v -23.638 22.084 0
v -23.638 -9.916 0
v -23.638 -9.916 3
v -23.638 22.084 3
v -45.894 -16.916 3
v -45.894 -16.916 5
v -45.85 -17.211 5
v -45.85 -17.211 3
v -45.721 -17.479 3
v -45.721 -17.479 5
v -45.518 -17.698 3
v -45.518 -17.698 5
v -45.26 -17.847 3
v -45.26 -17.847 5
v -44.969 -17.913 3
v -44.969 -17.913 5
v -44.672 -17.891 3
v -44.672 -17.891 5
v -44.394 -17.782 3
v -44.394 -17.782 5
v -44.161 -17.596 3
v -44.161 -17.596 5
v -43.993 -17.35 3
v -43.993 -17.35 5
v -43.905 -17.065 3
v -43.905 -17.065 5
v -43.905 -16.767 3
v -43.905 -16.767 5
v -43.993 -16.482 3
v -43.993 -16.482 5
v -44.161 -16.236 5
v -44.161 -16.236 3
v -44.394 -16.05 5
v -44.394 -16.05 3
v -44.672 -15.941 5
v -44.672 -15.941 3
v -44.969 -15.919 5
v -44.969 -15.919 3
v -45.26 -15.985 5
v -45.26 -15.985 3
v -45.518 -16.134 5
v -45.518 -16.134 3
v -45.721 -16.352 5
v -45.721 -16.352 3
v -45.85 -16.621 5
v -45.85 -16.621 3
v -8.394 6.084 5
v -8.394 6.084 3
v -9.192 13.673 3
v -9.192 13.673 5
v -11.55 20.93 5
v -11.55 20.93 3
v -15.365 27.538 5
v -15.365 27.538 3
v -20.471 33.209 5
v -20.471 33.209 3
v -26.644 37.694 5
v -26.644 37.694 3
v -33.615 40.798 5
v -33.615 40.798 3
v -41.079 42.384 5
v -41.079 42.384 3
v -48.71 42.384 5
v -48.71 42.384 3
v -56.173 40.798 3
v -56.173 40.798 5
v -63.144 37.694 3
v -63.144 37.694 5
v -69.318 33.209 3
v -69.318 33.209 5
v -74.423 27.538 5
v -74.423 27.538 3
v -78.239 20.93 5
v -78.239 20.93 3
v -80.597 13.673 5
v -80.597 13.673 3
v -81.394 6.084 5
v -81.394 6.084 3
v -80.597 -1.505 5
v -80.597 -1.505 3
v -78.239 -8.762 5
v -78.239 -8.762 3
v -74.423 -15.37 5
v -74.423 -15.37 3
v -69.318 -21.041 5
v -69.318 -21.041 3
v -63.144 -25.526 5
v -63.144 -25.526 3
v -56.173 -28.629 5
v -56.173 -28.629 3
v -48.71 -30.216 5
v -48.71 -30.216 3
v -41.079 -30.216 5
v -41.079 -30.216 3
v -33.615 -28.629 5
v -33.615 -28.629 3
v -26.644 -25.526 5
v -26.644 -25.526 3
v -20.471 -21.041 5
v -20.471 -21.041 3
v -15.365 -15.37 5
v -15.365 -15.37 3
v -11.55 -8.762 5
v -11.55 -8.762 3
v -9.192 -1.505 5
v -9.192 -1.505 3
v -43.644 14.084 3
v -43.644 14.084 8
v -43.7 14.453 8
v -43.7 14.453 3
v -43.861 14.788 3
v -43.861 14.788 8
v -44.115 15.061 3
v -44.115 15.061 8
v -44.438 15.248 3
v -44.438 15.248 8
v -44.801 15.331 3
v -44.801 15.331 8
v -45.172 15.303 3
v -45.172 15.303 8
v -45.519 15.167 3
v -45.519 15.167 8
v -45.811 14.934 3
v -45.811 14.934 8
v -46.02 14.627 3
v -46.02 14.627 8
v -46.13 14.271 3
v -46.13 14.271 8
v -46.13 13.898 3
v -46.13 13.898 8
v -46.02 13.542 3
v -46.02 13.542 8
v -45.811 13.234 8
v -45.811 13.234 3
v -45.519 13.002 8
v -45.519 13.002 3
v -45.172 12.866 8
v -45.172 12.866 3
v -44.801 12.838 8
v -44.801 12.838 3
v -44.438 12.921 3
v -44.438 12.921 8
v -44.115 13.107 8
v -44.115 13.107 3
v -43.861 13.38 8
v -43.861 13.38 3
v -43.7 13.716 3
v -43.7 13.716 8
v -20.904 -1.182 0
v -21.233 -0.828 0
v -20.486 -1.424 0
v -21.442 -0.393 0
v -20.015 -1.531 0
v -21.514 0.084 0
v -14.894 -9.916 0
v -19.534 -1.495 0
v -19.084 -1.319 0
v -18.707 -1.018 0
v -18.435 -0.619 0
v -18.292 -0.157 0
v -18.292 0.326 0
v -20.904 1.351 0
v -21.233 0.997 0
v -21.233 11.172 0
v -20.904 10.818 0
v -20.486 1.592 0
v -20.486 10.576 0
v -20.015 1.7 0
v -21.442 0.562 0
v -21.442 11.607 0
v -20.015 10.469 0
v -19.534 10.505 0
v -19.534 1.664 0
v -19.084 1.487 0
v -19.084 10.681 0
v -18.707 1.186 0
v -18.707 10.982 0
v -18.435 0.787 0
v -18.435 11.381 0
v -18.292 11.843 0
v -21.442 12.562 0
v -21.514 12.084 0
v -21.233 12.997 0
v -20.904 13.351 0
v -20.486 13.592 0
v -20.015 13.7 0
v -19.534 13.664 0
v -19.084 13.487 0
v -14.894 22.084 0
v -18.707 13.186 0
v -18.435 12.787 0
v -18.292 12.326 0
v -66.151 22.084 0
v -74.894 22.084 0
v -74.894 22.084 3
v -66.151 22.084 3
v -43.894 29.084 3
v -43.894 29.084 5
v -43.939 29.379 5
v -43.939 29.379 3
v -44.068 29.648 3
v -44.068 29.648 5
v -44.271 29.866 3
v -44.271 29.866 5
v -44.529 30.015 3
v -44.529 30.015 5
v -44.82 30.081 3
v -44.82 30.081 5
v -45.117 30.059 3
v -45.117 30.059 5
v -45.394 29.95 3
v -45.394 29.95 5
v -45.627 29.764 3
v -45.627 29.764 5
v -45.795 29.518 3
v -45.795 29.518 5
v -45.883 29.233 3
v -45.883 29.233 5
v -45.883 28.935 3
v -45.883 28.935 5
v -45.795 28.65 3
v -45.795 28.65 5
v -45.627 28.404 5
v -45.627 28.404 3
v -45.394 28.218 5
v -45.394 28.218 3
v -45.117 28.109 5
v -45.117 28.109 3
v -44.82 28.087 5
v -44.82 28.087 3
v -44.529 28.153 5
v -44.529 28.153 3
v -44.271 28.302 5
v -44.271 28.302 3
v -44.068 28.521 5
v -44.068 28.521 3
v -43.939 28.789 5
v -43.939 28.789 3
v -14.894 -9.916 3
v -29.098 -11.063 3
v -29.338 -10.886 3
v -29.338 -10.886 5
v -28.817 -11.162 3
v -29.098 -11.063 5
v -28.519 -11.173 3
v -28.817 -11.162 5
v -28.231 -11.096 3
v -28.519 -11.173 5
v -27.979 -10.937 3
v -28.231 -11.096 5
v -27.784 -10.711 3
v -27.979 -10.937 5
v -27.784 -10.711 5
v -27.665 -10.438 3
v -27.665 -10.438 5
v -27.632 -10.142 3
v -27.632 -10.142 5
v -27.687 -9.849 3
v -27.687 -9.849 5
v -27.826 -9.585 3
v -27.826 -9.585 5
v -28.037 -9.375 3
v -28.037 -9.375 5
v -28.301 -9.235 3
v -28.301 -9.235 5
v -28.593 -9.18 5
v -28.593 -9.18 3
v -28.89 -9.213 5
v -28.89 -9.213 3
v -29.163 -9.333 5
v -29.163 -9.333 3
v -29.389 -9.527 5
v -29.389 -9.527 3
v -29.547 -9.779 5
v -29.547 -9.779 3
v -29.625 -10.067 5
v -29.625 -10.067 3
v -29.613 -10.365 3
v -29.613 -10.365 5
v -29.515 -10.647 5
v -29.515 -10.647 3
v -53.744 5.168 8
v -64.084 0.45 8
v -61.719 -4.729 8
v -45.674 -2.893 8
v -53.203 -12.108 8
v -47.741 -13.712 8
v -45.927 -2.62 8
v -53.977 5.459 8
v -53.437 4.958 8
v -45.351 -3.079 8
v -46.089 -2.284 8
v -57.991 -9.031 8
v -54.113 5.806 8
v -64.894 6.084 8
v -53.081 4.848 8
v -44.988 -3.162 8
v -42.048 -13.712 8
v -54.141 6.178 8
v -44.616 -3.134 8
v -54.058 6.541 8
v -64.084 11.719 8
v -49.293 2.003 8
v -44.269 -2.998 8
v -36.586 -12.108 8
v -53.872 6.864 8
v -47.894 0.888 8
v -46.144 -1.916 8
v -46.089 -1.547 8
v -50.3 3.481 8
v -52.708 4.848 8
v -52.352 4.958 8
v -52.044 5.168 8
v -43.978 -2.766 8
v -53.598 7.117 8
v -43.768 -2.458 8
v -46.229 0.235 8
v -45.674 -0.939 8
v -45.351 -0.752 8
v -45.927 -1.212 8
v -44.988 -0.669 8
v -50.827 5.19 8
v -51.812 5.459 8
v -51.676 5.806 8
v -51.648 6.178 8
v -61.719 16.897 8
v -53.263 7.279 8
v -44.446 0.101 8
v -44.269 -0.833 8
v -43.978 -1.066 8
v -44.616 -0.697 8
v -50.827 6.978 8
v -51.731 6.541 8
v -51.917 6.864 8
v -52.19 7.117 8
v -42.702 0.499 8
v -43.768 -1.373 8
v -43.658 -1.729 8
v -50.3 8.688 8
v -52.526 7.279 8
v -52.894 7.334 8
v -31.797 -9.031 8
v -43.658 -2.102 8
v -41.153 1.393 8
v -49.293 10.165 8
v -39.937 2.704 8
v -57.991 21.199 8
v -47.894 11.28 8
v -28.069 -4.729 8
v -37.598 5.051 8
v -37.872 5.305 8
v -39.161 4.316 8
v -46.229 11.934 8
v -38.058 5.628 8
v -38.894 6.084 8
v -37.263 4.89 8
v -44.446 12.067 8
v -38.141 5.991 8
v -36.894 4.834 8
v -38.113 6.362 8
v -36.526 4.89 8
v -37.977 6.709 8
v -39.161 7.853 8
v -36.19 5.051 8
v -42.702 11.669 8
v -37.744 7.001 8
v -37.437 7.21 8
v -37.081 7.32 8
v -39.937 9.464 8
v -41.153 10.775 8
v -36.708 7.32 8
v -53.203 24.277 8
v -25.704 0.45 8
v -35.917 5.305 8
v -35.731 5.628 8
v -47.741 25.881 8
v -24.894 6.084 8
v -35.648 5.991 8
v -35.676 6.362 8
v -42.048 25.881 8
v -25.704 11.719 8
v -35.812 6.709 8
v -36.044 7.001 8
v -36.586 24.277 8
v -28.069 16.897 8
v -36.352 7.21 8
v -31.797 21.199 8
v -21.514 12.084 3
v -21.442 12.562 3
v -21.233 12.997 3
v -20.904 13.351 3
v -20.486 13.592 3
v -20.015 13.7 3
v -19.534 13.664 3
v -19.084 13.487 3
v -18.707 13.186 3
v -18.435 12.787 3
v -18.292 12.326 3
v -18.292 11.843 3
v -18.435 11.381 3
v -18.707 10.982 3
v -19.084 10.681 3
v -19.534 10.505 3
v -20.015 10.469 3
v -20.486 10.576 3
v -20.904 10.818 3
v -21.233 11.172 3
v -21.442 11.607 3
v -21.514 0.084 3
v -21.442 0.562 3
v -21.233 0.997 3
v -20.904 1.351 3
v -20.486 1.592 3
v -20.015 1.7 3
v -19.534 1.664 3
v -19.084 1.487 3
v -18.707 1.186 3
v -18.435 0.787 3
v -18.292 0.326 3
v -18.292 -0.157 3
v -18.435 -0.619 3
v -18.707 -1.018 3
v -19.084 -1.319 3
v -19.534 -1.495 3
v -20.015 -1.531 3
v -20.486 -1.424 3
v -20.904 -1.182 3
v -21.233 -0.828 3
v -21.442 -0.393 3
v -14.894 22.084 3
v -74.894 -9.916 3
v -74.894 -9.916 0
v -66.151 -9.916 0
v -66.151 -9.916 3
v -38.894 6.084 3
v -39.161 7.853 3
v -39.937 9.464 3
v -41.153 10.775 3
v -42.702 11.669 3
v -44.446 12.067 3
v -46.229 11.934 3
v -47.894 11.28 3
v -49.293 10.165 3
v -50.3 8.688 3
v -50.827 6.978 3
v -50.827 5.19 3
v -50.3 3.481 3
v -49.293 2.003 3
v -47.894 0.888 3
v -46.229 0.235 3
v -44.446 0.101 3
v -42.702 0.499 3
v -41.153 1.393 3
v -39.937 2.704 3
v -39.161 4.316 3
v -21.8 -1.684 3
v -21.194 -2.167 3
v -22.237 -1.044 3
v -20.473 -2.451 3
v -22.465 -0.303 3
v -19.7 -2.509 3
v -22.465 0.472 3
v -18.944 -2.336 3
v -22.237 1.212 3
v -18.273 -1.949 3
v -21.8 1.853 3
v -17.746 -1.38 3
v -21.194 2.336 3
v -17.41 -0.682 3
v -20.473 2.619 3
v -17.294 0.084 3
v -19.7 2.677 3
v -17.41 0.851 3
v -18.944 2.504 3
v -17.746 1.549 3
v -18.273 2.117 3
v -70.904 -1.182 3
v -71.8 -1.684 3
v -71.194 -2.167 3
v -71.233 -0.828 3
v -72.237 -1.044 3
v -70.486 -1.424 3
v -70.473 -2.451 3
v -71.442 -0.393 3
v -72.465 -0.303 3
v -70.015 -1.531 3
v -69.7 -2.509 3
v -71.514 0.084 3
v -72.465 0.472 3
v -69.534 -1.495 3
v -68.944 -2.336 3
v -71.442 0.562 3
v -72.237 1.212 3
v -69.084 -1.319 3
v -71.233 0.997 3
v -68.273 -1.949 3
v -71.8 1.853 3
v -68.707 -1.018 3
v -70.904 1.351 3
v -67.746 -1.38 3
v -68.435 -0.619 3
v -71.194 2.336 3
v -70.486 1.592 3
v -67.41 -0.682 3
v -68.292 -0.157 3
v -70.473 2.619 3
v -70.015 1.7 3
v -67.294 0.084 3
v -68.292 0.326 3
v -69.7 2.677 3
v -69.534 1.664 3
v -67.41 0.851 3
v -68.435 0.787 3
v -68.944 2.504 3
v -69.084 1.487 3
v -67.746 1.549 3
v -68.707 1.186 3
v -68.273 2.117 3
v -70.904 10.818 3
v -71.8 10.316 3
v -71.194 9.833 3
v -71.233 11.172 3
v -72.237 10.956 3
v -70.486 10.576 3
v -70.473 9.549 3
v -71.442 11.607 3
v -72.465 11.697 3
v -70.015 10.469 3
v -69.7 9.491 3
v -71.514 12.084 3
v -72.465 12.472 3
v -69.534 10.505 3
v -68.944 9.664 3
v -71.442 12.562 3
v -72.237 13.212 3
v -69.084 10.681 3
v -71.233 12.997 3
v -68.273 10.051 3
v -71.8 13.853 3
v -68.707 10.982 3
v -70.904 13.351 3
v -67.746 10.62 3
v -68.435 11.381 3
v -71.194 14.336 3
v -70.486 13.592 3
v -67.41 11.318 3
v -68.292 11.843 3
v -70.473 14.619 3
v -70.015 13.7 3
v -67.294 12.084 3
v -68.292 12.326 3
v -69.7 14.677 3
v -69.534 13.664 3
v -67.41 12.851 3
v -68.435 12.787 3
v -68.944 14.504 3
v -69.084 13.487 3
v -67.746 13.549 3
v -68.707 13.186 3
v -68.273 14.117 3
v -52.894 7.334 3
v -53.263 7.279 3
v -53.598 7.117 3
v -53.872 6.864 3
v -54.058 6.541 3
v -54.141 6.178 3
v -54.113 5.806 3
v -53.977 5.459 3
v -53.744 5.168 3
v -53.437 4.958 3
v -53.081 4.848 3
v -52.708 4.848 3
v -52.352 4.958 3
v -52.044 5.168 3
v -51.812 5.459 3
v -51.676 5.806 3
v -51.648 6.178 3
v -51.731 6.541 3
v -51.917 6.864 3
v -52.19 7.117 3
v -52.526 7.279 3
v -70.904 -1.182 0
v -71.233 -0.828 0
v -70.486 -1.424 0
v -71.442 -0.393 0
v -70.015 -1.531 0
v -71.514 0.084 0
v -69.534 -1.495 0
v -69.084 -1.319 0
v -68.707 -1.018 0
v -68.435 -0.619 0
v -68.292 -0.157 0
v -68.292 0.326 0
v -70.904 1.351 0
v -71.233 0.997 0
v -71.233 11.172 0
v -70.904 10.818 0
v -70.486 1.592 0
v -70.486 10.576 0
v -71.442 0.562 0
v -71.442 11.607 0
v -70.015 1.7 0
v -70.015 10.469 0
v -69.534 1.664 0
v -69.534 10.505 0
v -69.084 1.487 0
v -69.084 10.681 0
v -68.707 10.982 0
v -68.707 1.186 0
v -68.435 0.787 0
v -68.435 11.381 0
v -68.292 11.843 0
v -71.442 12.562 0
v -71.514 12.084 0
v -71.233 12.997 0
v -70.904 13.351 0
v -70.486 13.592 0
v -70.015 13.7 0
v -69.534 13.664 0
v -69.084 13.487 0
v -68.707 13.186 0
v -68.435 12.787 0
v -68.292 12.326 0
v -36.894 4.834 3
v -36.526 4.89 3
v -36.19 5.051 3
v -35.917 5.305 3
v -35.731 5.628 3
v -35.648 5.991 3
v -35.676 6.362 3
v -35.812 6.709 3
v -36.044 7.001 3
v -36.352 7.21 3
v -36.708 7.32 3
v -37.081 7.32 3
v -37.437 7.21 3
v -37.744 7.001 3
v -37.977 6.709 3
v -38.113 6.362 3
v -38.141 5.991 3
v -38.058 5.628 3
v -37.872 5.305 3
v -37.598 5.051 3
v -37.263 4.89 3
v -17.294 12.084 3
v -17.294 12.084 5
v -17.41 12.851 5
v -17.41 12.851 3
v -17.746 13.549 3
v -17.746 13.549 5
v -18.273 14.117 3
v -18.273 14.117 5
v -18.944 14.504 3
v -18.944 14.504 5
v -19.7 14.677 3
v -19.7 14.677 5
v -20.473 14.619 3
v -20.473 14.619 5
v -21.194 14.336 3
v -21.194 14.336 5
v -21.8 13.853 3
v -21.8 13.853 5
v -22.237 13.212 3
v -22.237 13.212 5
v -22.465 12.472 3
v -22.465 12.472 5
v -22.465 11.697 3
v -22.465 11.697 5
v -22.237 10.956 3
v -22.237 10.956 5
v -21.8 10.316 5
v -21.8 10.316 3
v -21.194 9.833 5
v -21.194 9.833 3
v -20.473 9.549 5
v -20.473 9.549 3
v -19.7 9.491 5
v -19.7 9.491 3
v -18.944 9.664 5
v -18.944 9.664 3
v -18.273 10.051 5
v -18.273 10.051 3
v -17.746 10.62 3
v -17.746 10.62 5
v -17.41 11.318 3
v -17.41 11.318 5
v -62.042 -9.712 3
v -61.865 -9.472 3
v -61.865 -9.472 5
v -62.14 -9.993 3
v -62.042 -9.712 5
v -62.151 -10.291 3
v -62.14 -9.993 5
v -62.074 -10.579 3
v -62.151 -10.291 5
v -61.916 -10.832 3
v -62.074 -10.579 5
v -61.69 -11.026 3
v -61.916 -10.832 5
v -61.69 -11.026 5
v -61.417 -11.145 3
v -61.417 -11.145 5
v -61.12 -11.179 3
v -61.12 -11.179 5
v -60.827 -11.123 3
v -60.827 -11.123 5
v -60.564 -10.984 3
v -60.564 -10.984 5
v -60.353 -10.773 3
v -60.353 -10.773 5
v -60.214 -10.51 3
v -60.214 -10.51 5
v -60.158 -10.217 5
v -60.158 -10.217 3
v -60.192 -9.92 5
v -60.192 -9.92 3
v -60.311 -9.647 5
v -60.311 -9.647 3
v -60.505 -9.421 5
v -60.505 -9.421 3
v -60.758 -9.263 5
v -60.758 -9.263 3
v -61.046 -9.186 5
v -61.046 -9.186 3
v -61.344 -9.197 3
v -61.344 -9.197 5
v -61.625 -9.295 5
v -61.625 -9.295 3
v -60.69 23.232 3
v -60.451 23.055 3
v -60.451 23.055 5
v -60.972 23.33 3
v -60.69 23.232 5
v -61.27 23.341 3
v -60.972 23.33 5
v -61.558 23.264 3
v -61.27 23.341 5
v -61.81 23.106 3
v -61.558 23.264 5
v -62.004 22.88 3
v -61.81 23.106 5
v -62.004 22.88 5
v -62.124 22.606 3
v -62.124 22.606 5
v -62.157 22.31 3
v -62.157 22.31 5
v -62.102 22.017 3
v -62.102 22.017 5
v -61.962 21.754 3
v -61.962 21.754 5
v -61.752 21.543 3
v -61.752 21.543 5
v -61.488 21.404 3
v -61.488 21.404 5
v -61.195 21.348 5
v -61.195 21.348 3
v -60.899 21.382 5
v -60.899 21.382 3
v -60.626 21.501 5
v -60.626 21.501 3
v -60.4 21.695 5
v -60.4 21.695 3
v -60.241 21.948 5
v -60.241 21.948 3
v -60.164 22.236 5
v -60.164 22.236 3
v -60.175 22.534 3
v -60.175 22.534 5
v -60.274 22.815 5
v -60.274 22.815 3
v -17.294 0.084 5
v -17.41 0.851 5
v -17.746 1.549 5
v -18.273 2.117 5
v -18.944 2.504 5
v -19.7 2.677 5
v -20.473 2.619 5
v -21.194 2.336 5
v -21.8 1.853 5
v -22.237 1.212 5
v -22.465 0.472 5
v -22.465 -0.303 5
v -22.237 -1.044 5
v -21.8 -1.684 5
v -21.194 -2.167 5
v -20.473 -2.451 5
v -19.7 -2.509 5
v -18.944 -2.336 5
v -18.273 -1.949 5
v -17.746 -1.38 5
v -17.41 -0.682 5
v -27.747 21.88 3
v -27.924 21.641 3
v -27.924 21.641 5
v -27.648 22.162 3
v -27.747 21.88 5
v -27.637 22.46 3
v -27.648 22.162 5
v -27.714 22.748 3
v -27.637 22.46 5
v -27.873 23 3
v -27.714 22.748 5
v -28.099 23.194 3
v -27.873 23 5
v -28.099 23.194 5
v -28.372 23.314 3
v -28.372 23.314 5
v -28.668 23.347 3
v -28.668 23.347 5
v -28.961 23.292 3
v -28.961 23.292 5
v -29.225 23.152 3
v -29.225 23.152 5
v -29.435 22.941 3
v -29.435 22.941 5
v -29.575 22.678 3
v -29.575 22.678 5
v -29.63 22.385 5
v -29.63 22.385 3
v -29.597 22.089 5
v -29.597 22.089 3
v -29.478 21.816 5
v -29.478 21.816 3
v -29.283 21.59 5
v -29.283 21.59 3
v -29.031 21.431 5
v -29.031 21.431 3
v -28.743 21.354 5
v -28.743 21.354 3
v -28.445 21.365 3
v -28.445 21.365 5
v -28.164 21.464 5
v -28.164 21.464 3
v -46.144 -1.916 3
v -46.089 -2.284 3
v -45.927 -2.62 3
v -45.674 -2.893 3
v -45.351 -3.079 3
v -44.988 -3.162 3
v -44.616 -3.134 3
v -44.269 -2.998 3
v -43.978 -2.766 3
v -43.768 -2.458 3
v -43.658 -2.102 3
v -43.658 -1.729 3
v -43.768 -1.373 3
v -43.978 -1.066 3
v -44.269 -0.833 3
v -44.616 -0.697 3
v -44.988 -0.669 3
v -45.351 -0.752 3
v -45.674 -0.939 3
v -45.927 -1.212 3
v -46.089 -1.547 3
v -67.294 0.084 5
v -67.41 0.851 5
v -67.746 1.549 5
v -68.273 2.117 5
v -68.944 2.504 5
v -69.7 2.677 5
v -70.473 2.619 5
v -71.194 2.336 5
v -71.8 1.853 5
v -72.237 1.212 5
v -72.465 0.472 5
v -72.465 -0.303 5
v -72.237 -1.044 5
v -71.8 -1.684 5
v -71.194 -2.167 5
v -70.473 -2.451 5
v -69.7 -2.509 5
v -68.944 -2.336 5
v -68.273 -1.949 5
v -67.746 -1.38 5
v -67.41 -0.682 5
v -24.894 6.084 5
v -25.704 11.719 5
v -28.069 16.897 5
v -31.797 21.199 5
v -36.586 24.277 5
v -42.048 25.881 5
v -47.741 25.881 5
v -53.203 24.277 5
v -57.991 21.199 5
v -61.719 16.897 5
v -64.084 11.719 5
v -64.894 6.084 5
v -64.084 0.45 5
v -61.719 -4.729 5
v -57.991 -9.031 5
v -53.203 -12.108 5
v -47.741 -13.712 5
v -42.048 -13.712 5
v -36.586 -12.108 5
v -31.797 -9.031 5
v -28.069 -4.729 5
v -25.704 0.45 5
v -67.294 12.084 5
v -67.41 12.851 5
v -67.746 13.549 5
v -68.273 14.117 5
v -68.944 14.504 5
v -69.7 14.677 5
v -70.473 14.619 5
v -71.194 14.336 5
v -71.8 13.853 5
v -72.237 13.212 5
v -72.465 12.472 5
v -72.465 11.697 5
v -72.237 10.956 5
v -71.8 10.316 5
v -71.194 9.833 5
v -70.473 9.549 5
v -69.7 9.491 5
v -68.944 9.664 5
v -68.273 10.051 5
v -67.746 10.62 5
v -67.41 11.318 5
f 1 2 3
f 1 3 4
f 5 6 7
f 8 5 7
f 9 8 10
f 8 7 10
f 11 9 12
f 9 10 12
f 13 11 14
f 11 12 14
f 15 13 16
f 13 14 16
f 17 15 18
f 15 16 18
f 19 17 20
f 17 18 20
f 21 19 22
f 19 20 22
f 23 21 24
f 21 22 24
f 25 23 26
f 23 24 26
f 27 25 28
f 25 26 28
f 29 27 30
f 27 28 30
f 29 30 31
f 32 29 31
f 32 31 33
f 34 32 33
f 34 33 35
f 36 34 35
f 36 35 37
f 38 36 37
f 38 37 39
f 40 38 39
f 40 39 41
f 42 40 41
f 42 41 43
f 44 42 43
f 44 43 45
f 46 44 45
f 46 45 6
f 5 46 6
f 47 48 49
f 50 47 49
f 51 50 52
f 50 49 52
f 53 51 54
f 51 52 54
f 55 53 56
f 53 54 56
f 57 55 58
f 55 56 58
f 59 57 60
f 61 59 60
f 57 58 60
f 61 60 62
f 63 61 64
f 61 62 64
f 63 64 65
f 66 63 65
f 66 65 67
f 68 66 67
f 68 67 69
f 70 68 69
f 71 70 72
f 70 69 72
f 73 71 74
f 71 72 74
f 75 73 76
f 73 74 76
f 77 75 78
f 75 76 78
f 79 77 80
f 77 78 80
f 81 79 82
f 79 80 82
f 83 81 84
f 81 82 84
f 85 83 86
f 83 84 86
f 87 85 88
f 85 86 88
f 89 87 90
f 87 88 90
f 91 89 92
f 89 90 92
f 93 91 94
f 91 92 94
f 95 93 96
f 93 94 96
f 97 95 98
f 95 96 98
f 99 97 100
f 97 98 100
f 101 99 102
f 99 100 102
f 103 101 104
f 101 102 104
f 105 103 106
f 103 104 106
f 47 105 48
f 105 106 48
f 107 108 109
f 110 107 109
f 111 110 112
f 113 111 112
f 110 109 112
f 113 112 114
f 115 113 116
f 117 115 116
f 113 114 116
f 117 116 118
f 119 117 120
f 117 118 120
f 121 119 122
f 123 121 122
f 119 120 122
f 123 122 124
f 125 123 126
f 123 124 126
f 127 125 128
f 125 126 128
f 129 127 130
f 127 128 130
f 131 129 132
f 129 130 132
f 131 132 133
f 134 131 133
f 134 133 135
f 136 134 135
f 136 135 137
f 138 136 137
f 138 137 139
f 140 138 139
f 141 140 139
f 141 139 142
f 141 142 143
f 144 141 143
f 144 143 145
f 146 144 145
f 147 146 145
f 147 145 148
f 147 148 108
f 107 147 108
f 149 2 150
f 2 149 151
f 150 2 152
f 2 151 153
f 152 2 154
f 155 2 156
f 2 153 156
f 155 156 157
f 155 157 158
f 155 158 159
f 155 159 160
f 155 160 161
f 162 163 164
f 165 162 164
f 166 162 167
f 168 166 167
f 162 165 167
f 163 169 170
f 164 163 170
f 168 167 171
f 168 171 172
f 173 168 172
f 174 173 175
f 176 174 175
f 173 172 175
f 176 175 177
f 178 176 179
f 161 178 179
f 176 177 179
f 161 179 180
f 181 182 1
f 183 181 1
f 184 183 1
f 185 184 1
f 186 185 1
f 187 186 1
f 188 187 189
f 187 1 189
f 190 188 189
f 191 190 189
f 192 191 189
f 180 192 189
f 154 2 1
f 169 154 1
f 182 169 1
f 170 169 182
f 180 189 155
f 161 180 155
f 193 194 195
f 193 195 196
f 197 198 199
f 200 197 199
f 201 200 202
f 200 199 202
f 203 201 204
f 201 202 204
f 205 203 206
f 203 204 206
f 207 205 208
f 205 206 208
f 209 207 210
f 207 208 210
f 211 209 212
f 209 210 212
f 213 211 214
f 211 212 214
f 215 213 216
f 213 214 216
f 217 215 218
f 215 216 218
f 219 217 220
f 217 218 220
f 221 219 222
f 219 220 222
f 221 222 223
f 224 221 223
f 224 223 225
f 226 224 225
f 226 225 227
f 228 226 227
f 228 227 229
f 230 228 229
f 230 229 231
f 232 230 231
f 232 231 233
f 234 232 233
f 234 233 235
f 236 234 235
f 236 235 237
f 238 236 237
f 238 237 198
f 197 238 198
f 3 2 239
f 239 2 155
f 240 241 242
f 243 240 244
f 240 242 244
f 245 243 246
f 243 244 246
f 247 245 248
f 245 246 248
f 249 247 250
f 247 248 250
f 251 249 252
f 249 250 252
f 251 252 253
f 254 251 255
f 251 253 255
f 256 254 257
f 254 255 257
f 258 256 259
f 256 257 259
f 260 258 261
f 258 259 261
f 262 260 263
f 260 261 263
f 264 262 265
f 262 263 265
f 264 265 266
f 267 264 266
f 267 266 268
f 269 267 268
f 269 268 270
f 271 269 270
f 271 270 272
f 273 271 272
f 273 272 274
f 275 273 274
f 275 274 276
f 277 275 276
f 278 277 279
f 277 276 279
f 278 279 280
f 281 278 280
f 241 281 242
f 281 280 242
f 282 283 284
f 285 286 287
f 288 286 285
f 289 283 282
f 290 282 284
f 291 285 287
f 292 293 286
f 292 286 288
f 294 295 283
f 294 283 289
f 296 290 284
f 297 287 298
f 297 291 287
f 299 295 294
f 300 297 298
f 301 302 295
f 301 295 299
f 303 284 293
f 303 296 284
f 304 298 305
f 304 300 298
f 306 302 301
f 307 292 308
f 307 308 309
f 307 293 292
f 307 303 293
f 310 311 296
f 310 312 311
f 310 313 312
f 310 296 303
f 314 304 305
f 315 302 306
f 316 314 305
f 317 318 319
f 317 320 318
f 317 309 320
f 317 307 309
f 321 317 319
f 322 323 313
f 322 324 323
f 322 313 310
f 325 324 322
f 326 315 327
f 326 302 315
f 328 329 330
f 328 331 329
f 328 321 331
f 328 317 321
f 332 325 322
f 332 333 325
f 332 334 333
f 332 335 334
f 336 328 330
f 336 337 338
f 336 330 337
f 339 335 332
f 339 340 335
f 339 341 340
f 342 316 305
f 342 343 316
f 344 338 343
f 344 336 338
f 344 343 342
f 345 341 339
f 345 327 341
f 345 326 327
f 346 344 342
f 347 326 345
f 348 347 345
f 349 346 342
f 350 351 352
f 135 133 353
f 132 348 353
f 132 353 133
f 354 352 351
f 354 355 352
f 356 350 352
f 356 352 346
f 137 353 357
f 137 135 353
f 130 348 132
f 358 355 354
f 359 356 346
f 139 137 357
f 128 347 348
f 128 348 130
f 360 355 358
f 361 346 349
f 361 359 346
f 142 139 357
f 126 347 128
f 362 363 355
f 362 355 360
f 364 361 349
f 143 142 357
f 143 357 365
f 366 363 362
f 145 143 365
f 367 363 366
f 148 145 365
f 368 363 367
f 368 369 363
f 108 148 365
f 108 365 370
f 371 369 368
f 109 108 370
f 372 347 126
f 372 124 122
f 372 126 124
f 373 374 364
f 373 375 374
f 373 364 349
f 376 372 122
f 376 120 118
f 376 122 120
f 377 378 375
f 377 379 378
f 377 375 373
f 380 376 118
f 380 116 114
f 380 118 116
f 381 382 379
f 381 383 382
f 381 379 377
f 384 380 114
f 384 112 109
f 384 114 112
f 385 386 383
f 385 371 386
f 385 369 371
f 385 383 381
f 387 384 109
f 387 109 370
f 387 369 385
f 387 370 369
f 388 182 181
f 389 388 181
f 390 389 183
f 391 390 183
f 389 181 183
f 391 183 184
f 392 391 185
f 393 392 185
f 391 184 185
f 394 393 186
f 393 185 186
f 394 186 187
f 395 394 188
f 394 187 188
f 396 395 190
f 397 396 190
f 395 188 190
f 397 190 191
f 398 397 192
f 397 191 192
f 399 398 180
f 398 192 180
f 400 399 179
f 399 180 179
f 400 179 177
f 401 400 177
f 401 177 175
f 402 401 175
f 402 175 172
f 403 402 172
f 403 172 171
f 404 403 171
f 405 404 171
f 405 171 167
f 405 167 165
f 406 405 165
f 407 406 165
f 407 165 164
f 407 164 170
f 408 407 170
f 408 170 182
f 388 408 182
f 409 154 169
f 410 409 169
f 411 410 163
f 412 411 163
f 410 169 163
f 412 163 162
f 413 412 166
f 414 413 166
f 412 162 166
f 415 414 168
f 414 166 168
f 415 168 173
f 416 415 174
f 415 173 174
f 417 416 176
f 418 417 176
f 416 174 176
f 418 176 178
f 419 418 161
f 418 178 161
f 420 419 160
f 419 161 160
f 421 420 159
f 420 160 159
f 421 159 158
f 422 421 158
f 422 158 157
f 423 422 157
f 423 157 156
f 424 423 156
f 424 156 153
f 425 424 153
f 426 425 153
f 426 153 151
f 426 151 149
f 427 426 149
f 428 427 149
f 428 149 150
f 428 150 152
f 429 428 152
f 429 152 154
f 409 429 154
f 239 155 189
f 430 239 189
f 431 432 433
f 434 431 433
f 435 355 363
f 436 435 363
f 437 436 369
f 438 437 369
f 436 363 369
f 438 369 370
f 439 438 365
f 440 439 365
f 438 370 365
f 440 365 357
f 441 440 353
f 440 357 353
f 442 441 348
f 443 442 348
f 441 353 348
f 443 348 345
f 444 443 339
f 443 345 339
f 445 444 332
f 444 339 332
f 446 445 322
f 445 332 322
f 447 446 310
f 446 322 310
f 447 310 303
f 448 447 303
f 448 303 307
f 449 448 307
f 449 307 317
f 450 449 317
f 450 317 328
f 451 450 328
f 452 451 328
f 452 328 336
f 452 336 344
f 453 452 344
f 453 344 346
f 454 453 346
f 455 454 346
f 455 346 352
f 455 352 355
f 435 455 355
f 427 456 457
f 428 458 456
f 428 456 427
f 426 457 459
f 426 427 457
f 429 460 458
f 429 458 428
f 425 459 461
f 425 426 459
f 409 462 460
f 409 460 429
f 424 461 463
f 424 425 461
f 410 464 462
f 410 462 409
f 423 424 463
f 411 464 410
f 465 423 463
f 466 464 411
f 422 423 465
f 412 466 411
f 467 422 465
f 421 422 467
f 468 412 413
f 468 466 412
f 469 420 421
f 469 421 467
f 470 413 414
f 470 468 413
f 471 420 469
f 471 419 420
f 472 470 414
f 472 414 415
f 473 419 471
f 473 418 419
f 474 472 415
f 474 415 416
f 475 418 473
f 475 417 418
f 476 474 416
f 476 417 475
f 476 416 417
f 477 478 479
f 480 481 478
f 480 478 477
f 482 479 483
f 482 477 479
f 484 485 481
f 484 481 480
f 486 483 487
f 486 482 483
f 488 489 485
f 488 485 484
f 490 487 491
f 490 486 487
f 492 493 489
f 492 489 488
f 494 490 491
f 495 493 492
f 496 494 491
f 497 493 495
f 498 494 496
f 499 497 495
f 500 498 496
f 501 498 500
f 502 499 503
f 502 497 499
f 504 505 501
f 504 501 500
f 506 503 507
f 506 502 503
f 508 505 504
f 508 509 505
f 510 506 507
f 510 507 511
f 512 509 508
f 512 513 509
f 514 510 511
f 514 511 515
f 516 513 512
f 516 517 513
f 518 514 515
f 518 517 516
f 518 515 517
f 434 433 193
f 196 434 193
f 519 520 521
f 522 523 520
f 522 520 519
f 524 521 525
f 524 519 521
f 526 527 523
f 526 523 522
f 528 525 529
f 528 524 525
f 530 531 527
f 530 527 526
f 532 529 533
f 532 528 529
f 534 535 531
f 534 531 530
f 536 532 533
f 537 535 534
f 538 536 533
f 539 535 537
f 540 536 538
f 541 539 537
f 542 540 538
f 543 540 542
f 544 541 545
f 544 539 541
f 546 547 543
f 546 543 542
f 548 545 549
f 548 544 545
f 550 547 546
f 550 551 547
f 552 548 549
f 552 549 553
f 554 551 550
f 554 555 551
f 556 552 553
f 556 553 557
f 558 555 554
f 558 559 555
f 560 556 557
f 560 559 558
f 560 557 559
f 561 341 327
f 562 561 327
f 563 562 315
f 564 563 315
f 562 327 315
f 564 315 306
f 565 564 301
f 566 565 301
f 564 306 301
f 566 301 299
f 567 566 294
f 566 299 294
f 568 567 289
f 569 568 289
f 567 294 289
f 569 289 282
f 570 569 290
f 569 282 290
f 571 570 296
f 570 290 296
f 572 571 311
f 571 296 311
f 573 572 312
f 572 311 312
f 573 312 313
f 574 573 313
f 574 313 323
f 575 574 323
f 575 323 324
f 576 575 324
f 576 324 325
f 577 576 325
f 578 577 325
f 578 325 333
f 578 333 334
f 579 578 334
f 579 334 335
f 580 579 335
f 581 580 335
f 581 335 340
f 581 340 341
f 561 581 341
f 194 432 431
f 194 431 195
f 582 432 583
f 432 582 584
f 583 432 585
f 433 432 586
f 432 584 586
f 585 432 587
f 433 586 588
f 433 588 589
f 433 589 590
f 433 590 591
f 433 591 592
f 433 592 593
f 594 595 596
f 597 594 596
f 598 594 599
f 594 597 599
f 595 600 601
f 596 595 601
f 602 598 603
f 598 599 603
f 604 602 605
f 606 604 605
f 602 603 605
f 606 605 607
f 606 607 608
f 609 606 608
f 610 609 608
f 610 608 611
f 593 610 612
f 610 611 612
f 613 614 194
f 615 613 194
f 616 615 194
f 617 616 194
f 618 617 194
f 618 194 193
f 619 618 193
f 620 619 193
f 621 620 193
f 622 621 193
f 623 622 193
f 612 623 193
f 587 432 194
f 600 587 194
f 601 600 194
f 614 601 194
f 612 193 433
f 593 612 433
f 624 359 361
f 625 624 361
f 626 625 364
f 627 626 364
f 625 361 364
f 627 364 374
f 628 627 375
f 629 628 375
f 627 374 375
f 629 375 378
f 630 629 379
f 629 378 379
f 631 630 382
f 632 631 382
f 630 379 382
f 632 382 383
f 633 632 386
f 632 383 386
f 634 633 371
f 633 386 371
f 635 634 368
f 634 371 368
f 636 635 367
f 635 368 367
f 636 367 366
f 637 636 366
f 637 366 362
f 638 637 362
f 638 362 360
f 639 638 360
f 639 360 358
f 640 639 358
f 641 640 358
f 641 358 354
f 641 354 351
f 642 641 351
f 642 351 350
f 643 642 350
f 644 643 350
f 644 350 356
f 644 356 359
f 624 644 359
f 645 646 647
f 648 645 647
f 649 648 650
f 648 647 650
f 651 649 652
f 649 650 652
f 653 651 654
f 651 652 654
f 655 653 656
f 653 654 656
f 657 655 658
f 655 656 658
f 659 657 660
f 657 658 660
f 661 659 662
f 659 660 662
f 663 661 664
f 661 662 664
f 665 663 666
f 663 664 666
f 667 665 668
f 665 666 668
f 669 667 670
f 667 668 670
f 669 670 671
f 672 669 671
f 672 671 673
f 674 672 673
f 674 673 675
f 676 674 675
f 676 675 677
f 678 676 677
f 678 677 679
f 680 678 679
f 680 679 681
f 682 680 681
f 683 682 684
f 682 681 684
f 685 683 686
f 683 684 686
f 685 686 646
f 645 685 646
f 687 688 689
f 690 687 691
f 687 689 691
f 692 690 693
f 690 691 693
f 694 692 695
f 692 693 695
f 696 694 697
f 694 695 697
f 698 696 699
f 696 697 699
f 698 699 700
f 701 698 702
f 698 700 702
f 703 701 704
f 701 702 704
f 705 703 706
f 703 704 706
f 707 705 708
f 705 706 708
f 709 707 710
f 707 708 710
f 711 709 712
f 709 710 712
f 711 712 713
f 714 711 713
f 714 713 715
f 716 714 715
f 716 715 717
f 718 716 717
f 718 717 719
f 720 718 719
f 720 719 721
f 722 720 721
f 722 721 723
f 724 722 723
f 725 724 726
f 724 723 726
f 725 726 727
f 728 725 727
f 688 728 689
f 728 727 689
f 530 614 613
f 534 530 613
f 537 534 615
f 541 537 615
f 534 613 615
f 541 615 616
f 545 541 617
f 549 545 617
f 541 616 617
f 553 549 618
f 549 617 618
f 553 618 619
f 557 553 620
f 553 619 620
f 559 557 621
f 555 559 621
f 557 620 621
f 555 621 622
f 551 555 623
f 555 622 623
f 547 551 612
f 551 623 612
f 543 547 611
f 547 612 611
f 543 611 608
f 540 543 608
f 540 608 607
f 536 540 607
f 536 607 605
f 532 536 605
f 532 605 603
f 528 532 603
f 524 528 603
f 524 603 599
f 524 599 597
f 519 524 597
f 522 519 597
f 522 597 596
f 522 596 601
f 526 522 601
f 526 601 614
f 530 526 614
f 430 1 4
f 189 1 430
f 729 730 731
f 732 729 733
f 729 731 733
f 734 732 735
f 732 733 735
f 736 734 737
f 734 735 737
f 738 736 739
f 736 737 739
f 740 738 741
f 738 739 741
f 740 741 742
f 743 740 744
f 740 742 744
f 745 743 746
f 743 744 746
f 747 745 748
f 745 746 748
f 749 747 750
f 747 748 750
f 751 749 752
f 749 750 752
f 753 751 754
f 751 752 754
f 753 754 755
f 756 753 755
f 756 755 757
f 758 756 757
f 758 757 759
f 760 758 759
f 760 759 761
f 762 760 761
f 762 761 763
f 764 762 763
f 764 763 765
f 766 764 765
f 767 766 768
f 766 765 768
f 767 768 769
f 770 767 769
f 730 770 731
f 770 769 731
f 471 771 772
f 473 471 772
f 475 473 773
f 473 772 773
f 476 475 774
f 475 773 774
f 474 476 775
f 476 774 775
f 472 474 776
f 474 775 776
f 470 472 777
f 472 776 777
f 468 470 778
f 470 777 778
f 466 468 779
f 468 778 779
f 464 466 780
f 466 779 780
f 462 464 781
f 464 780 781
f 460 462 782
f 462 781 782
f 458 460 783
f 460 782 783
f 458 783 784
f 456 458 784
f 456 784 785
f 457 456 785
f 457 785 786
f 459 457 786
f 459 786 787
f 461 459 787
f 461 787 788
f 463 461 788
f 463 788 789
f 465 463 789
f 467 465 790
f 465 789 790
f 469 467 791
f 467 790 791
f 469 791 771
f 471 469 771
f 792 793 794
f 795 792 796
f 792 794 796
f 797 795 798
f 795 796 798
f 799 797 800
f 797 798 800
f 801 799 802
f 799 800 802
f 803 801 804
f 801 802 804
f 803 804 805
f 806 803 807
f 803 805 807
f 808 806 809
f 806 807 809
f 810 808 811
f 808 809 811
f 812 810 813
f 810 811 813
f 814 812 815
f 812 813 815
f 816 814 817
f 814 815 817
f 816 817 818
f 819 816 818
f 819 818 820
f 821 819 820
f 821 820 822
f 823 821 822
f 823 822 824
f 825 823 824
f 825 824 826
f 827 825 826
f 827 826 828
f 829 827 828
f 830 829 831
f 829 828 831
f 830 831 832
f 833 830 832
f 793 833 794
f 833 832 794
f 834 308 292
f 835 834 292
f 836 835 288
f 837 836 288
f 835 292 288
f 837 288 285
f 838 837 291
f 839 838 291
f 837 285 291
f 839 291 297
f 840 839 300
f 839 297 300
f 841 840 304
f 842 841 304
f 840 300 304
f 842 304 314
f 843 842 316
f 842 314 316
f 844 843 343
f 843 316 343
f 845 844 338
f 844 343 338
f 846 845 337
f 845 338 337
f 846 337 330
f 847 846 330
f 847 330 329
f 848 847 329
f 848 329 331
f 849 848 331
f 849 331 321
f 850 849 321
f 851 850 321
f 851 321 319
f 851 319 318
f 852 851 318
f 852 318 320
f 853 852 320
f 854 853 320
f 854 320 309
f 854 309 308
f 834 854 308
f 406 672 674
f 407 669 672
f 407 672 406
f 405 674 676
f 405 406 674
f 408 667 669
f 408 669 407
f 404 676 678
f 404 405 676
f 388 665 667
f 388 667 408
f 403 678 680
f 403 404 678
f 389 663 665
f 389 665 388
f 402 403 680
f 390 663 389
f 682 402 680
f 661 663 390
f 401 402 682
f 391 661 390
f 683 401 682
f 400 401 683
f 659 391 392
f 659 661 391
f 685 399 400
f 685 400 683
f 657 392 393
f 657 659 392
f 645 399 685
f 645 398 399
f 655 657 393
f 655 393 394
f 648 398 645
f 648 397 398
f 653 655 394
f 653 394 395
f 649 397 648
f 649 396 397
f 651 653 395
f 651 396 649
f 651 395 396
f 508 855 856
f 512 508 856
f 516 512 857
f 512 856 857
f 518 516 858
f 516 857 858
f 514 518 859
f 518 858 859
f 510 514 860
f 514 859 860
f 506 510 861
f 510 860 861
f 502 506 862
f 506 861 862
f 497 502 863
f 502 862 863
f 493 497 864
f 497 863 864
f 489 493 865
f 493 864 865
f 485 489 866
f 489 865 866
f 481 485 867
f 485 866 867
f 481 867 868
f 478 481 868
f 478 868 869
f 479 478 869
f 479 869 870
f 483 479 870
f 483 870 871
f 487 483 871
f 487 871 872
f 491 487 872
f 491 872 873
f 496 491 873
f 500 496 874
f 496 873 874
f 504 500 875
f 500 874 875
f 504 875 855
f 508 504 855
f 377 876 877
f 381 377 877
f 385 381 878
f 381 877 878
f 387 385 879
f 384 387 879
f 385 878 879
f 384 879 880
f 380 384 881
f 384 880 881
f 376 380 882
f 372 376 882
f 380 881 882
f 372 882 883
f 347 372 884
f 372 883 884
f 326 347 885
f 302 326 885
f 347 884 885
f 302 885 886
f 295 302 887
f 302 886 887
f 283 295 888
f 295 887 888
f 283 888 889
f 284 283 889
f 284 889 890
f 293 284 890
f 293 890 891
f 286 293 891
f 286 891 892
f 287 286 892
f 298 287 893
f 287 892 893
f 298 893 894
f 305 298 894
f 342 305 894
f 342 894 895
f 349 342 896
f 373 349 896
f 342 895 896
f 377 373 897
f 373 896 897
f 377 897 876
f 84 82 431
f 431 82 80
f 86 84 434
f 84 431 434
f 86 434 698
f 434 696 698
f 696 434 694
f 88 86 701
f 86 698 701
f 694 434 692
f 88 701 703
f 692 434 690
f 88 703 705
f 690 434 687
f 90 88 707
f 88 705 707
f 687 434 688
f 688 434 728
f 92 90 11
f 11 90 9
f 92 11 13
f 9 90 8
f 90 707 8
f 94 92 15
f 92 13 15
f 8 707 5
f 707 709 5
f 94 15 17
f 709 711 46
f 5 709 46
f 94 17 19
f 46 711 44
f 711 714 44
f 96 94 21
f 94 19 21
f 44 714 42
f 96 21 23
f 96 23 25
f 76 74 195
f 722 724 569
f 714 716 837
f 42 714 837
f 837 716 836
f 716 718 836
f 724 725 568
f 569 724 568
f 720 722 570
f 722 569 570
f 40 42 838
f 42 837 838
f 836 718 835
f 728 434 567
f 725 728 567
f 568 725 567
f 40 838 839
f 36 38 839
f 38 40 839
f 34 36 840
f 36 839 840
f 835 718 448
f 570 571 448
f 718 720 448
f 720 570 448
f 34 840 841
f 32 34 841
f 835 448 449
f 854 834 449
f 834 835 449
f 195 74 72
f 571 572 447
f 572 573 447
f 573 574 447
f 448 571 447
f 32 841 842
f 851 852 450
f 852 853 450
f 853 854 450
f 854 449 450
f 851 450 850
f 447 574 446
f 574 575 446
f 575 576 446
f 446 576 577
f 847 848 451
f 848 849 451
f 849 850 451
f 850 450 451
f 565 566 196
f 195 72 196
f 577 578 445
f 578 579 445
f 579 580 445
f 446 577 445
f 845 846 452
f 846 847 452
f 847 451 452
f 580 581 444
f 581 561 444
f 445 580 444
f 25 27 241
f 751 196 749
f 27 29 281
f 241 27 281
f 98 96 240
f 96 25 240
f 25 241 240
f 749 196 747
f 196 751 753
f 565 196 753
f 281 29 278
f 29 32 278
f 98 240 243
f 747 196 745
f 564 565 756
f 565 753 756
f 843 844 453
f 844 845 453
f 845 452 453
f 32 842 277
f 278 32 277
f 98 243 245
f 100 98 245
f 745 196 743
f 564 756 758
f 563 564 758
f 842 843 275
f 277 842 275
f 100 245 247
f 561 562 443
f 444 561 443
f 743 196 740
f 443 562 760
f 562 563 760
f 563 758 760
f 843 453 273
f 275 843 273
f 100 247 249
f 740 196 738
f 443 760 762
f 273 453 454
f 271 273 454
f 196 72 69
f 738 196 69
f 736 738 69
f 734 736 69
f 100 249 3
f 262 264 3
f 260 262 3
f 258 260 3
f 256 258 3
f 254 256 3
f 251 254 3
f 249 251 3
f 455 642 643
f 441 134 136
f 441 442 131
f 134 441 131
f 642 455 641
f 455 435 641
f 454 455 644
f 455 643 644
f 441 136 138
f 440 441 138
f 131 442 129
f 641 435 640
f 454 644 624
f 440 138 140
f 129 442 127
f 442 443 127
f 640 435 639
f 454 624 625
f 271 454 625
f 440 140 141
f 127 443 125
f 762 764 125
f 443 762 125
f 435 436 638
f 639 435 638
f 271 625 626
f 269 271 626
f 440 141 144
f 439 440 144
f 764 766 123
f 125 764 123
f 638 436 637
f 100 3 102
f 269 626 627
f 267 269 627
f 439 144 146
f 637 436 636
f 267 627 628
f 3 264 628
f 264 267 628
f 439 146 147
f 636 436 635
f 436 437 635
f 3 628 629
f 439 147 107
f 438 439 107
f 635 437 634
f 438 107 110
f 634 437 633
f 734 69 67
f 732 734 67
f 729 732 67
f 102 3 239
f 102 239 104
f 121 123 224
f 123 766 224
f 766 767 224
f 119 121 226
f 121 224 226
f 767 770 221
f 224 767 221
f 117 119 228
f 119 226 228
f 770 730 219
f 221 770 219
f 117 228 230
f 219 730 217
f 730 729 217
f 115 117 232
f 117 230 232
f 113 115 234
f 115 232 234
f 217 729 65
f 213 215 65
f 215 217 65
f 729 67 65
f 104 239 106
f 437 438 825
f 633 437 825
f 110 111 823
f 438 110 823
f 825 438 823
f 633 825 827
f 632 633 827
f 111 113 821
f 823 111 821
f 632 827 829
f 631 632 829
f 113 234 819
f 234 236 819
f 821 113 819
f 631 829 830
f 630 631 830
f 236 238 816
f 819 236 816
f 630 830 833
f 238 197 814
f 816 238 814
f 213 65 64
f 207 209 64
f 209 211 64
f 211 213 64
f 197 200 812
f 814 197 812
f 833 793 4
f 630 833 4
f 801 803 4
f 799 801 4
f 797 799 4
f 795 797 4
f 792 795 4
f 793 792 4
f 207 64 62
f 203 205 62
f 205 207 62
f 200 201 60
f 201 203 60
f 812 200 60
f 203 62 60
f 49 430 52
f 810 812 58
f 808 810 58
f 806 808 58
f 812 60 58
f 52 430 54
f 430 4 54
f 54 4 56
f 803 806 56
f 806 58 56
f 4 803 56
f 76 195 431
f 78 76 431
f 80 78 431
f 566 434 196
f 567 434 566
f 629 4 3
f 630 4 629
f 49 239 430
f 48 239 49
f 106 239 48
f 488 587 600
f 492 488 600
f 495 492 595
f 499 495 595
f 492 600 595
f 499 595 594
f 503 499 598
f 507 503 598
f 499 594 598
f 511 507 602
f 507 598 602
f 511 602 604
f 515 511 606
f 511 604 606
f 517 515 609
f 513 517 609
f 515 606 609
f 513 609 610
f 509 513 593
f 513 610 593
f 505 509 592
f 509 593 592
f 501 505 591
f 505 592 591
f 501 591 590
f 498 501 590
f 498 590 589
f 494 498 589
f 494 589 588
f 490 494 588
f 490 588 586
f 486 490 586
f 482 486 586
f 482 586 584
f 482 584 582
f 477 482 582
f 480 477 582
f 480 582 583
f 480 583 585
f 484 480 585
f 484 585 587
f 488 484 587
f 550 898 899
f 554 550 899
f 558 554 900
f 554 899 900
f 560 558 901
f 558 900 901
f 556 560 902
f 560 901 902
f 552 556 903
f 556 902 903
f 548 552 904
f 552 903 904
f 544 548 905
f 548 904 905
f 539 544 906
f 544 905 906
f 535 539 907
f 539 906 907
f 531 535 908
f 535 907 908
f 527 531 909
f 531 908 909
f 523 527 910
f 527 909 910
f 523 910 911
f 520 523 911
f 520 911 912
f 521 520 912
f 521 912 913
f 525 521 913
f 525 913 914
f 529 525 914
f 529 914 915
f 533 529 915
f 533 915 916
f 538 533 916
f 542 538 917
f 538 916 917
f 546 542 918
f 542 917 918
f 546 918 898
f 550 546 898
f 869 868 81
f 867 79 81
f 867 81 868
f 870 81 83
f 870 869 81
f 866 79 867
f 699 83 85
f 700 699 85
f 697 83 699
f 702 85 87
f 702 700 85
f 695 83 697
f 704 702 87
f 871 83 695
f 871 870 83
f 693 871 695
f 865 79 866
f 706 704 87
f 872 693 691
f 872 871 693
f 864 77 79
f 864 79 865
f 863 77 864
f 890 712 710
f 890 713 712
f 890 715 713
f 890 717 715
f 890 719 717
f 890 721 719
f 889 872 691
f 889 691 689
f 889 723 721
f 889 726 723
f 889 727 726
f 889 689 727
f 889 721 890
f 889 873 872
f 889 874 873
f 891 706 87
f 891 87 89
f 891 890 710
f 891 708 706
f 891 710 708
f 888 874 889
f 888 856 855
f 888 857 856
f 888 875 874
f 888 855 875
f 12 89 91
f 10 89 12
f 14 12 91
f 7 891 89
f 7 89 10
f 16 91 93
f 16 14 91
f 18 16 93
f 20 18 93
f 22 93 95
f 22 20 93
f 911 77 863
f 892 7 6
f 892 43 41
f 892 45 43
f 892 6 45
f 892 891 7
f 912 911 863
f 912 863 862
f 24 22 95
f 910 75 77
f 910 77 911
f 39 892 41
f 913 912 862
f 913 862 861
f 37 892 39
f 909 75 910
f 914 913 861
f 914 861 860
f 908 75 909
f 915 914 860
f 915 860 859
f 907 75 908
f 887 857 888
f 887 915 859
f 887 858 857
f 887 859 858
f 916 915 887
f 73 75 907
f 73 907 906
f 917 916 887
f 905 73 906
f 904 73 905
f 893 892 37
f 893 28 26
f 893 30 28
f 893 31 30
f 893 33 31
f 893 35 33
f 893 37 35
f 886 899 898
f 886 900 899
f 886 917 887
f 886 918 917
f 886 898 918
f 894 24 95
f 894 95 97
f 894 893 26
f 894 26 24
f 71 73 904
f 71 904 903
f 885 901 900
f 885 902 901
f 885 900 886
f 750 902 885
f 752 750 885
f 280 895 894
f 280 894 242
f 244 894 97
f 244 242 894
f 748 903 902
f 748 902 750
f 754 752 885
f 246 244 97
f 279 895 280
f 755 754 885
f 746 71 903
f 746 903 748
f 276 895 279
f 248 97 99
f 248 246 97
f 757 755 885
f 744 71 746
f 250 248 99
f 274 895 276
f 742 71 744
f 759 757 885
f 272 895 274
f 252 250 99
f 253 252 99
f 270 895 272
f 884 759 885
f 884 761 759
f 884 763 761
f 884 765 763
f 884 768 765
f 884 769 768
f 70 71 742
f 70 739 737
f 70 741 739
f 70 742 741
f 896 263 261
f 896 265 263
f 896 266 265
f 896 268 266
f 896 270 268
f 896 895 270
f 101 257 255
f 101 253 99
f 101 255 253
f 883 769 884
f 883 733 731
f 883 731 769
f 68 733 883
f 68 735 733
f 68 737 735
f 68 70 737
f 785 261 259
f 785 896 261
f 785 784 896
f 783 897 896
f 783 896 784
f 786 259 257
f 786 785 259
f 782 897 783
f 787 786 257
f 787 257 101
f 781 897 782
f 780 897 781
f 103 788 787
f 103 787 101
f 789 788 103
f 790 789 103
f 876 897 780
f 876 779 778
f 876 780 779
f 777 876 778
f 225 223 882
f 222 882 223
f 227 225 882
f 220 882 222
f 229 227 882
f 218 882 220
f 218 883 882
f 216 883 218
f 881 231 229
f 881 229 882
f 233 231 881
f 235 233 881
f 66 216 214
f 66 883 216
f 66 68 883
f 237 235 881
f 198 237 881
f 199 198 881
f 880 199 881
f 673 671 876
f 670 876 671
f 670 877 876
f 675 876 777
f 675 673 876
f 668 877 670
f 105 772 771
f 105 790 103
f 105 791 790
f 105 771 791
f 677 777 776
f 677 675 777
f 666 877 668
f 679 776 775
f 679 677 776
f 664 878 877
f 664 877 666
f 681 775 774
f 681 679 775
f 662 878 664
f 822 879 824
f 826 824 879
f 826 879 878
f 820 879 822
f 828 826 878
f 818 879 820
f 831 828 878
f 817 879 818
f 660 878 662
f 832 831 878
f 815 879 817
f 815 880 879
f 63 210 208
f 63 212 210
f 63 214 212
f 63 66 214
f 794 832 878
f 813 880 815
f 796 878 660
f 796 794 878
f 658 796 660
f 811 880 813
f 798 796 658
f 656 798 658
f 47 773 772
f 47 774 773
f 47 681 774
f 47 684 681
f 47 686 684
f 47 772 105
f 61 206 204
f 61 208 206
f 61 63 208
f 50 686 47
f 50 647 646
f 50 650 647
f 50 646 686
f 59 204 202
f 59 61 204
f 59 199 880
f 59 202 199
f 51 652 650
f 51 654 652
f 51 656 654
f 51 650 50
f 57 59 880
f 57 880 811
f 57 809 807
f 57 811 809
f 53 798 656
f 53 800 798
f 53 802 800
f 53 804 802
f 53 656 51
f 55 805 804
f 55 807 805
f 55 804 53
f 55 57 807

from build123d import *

# Parameters (mm, degrees)
SKETCH_1_W               = 60
SKETCH_1_H               = 32
EXTRUDE_1_DEPTH          = 3
SKETCH_3_R               = 36.5
EXTRUDE_2_DEPTH          = 2
SKETCH_4_R               = 1
CUT_EXTRUDE_2_DEPTH      = 10
PATTERN_CIRCULAR_1_COUNT = 8
SKETCH_5_R               = 5
CUT_EXTRUDE_3_DEPTH      = 3
SKETCH_6_R               = 3
EXTRUDE_3_DEPTH          = 5
SKETCH_7_R               = 1.62
CUT_EXTRUDE_4_DEPTH      = 5
SKETCH_9_R               = 2.6
CUT_EXTRUDE_5_DEPTH      = 2
SKETCH_10_R              = 20
EXTRUDE_4_DEPTH          = 3
SKETCH_11_R              = 1.25
CUT_EXTRUDE_6_DEPTH      = 10
PATTERN_CIRCULAR_2_COUNT = 4
SKETCH_12_W              = 42.513020476
SKETCH_12_H              = 32
CUT_EXTRUDE_7_DEPTH      = 3
SKETCH_13_R              = 6
CUT_EXTRUDE_8_DEPTH      = 10


with BuildPart() as part:
    # 草图1 → 凸台-拉伸1 (new body)
    with BuildSketch(Plane.XY):
        with Locations((-44.89426993, 6.0842078)):
            Rectangle(SKETCH_1_W, SKETCH_1_H)
    extrude(amount=EXTRUDE_1_DEPTH)

    # 草图3 → 凸台-拉伸2 (add)
    with BuildSketch(Plane.XY.offset(3)):
        with Locations((-44.89426993, 6.0842078)):
            Circle(SKETCH_3_R)
    extrude(amount=EXTRUDE_2_DEPTH)

    # 草图4 → 切除-拉伸2 (cut)
    with BuildSketch(Plane.XY.offset(5)):
        with Locations((-44.89426993, 29.0842078)):
            Circle(SKETCH_4_R)
    cut_extrude_2 = extrude(amount=-CUT_EXTRUDE_2_DEPTH, mode=Mode.SUBTRACT)

    # 阵列(圆周)1: 切除-拉伸2 ×8 about axis
    pattern_circular_1_axis = Axis((-44.89426993, 6.0842078, 0), (0, 0, 1))
    for i in range(1, PATTERN_CIRCULAR_1_COUNT):
        add(cut_extrude_2.rotate(pattern_circular_1_axis, i * 360 / PATTERN_CIRCULAR_1_COUNT), mode=Mode.SUBTRACT)

    # 草图5 → 切除-拉伸3 (cut)
    with BuildSketch(Plane(origin=(0, 0, 0), x_dir=(-1, 0, 0), z_dir=(0, 0, -1))):
        with Locations((28.630813963, 22.347663767)):
            Circle(SKETCH_5_R)
        with Locations((61.157725897, 22.347663767)):
            Circle(SKETCH_5_R)
        with Locations((28.630813963, -10.179248167)):
            Circle(SKETCH_5_R)
        with Locations((61.157725897, -10.179248167)):
            Circle(SKETCH_5_R)
    extrude(amount=-CUT_EXTRUDE_3_DEPTH, mode=Mode.SUBTRACT)

    # 草图6 → 凸台-拉伸3 (add)
    with BuildSketch(Plane(origin=(0, 0, 0), x_dir=(-1, 0, 0), z_dir=(0, 0, -1))):
        with Locations((21.89426993, 6.0842078)):
            Circle(SKETCH_6_R)
        with Locations((67.89426993, 6.0842078)):
            Circle(SKETCH_6_R)
    extrude(amount=-EXTRUDE_3_DEPTH)

    # 草图7 → 切除-拉伸4 (cut)
    with BuildSketch(Plane(origin=(0, 0, 0), x_dir=(-1, 0, 0), z_dir=(0, 0, -1))):
        with Locations((19.89426993, 12.0842078)):
            Circle(SKETCH_7_R)
        with Locations((19.89426993, 0.0842078)):
            Circle(SKETCH_7_R)
        with Locations((69.89426993, 12.0842078)):
            Circle(SKETCH_7_R)
        with Locations((69.89426993, 0.0842078)):
            Circle(SKETCH_7_R)
    extrude(amount=-CUT_EXTRUDE_4_DEPTH, mode=Mode.SUBTRACT)

    # 草图9 → 切除-拉伸5 (cut)
    with BuildSketch(Plane.XY.offset(5)):
        with Locations((-69.89426993, 12.0842078)):
            Circle(SKETCH_9_R)
        with Locations((-69.89426993, 0.0842078)):
            Circle(SKETCH_9_R)
        with Locations((-19.89426993, 12.0842078)):
            Circle(SKETCH_9_R)
        with Locations((-19.89426993, 0.0842078)):
            Circle(SKETCH_9_R)
    extrude(amount=-CUT_EXTRUDE_5_DEPTH, mode=Mode.SUBTRACT)

    # 草图10 → 凸台-拉伸4 (add)
    with BuildSketch(Plane.XY.offset(5)):
        with Locations((-44.89426993, 6.0842078)):
            Circle(SKETCH_10_R)
    extrude(amount=EXTRUDE_4_DEPTH)

    # 草图11 → 切除-拉伸6 (cut)
    with BuildSketch(Plane.XY.offset(8)):
        with Locations((-44.89426993, 14.0842078)):
            Circle(SKETCH_11_R)
    cut_extrude_6 = extrude(amount=-CUT_EXTRUDE_6_DEPTH, mode=Mode.SUBTRACT)

    # 阵列(圆周)2: 切除-拉伸6 ×4 about axis
    pattern_circular_2_axis = Axis((-44.89426993, 6.0842078, 0), (0, 0, 1))
    for i in range(1, PATTERN_CIRCULAR_2_COUNT):
        add(cut_extrude_6.rotate(pattern_circular_2_axis, i * 360 / PATTERN_CIRCULAR_2_COUNT), mode=Mode.SUBTRACT)

    # 草图12 → 切除-拉伸7 (cut)
    with BuildSketch(Plane(origin=(0, 0, 0), x_dir=(-1, 0, 0), z_dir=(0, 0, -1))):
        with Locations((44.89426993, 6.0842078)):
            Rectangle(SKETCH_12_W, SKETCH_12_H)
    extrude(amount=-CUT_EXTRUDE_7_DEPTH, mode=Mode.SUBTRACT)

    # 草图13 → 切除-拉伸8 (cut)
    with BuildSketch(Plane.XY.offset(8)):
        with Locations((-44.89426993, 6.0842078)):
            Circle(SKETCH_13_R)
    extrude(amount=-CUT_EXTRUDE_8_DEPTH, mode=Mode.SUBTRACT)


solid = part.part
